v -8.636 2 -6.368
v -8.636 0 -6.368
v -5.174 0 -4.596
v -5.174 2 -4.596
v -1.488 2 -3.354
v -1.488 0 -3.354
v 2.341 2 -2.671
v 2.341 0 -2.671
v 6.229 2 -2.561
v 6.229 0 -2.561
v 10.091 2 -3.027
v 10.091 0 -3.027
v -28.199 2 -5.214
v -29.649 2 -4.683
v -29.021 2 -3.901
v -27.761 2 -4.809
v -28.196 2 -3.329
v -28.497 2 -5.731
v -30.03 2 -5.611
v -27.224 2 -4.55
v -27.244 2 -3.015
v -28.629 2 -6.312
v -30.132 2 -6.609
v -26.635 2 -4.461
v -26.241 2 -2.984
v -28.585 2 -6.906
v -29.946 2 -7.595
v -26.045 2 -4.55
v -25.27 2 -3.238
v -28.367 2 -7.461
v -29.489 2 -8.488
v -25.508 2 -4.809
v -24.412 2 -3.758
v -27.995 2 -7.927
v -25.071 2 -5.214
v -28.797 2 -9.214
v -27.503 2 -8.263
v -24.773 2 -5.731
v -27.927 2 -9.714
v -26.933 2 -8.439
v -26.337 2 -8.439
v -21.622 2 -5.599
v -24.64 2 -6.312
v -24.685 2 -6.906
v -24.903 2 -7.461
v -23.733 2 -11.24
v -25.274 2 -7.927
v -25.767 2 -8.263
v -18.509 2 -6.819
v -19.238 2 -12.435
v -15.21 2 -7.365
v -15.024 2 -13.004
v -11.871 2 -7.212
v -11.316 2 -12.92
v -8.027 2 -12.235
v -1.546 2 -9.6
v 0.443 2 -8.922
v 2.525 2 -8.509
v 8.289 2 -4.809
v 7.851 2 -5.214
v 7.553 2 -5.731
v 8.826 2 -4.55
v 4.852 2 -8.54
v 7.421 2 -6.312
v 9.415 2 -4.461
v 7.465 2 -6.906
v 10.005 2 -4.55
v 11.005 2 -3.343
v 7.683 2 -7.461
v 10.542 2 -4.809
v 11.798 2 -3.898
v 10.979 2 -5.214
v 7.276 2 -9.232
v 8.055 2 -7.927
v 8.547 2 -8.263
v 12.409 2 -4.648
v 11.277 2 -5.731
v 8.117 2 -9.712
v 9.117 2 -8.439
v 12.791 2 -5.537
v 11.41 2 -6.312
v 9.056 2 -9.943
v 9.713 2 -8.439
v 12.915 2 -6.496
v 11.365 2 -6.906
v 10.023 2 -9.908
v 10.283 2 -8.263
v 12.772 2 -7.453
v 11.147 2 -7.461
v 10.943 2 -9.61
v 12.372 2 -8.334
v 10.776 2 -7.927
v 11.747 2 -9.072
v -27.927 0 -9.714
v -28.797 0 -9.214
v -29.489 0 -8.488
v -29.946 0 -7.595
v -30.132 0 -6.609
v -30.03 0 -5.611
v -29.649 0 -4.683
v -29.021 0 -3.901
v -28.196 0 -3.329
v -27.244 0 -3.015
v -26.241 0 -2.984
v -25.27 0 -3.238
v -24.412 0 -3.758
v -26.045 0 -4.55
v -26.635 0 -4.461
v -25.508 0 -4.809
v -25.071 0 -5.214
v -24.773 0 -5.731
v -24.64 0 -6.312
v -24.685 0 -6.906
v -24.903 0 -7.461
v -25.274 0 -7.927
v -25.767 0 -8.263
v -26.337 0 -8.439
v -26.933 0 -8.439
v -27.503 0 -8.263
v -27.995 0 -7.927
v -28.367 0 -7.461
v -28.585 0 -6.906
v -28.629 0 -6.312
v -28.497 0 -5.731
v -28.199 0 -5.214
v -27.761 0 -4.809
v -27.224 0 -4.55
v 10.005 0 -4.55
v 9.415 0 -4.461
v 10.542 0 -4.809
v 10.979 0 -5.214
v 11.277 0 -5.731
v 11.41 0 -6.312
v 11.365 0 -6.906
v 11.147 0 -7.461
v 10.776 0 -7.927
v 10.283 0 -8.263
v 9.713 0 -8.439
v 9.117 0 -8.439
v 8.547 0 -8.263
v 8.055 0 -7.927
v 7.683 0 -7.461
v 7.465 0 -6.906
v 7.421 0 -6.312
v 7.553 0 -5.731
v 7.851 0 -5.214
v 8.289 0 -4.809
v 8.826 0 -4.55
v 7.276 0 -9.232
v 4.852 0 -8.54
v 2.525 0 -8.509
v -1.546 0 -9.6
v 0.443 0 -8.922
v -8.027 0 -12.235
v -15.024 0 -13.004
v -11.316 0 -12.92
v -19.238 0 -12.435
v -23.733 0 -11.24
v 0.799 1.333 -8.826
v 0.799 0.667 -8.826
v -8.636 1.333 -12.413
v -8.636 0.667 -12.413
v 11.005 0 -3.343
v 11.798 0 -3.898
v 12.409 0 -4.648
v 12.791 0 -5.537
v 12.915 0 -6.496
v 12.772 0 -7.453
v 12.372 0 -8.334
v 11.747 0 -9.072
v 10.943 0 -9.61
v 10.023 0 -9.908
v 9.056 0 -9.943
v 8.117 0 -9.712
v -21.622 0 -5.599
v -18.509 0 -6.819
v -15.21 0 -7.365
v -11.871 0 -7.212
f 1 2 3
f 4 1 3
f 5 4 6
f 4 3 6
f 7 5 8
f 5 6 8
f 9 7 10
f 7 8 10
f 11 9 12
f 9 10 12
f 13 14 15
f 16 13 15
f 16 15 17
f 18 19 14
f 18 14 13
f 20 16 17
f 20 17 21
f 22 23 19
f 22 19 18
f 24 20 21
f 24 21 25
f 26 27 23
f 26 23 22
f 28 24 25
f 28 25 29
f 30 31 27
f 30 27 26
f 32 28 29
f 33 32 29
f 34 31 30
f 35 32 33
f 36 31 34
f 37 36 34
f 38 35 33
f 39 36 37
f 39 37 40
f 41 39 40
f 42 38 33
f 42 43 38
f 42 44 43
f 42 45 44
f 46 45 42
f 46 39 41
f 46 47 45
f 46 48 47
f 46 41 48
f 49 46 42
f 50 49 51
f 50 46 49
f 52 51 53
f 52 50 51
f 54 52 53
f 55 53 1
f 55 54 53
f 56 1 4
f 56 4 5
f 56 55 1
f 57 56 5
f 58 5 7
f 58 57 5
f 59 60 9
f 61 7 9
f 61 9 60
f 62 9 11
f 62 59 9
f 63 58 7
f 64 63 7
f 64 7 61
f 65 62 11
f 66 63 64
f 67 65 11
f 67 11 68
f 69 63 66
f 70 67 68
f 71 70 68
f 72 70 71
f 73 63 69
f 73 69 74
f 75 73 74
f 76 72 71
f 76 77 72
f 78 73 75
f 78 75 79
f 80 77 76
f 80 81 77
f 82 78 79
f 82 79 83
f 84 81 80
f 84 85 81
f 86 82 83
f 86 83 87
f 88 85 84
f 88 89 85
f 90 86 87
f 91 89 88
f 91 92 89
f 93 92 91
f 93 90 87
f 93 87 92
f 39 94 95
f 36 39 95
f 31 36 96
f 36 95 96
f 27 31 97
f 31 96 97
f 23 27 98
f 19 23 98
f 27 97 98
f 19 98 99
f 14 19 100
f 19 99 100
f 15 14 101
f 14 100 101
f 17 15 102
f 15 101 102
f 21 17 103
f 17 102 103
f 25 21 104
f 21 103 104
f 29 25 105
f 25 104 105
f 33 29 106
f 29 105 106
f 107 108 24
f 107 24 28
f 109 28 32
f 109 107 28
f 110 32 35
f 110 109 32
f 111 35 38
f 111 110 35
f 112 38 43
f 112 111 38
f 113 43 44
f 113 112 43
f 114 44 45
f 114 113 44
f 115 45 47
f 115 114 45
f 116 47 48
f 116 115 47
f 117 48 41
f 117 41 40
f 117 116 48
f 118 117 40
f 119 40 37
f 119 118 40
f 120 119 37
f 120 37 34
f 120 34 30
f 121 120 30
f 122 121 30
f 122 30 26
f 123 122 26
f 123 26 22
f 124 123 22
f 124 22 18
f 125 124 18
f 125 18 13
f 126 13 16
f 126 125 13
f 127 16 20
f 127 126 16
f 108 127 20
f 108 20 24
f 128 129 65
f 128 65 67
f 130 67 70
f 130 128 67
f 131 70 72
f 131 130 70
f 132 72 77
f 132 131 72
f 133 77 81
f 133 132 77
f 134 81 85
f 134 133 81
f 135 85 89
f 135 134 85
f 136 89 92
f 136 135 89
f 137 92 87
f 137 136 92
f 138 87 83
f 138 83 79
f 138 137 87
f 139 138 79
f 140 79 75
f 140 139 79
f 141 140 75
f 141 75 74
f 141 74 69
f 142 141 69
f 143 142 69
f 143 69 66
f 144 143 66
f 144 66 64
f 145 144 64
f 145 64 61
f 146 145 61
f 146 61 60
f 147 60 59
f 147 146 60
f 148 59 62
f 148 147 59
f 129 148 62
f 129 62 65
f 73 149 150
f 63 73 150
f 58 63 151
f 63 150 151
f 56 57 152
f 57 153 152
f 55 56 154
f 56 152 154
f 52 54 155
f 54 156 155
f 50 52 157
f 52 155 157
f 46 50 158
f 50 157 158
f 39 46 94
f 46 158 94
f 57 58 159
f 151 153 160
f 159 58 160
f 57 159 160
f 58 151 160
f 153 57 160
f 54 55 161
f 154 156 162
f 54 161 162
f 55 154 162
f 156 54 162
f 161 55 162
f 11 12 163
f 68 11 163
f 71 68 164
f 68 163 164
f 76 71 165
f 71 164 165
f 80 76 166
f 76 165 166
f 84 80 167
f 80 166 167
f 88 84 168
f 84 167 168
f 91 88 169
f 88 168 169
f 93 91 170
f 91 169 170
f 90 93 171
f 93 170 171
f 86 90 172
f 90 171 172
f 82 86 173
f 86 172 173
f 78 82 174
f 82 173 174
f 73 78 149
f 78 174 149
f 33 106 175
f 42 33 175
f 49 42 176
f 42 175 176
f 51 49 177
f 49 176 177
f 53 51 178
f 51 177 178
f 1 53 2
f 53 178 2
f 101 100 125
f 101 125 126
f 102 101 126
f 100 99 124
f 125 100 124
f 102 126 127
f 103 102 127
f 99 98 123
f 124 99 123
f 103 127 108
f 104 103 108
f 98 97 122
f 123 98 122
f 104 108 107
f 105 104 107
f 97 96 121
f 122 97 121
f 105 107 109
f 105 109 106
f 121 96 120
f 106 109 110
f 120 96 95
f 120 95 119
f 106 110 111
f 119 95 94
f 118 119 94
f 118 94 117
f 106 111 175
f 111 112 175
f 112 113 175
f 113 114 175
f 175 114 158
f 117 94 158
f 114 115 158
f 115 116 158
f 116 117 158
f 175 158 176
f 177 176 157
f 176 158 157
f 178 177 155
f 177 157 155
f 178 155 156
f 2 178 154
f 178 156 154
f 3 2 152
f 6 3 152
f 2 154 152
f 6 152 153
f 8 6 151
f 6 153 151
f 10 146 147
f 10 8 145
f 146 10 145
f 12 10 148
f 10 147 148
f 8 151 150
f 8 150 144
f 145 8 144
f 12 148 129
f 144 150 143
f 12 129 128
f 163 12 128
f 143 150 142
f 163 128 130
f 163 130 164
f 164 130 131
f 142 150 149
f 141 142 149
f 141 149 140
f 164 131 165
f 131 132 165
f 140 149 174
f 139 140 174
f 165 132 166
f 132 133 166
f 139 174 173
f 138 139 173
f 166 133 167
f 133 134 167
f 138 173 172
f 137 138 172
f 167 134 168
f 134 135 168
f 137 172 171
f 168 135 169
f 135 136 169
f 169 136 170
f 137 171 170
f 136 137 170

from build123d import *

# Parameters (mm, degrees)
SKETCH2_R           = 2.000000006
BOSS_EXTRUDE1_DEPTH = 2


with BuildPart() as part:
    # Sketch2 → Boss-Extrude1 (new body)
    with BuildSketch(Plane(origin=(0, 0, 0), x_dir=(1, 0, 0), z_dir=(0, 1, 0))):
        with BuildLine():
            ThreePointArc((-27.926975425, 9.714102761), (-29.649166118, 4.682637411), (-24.412176183, 3.757693749))
            ThreePointArc((-24.412176183, 3.757693749), (-16.874008703, 7.178664325), (-8.63567196, 6.368222256))
            ThreePointArc((-8.63567196, 6.368222256), (0.414236301, 2.94154028), (10.090788082, 3.027182087))
            ThreePointArc((10.090788082, 3.027182087), (12.602603797, 7.907109409), (7.276457736, 9.231902599))
            add(Edge.make_bspline(
                [(7.276457736, 9.231902599), (4.991666248, 8.239417516), (-0.384919766, 8.392254408), (-11.300329238, 15.23385505), (-22.195691788, 12.013740113), (-27.926975425, 9.714102761)],
                knots=[0.02947385, 0.02947385, 0.02947385, 0.02947385, 0.205279709, 0.474213823, 1, 1, 1, 1], degree=3))
        make_face()
        with Locations(Location((-26.634838433, 6.461352848, 0), (0, 0, 270))):
            Circle(SKETCH2_R, mode=Mode.SUBTRACT)
        with Locations(Location((9.415161567, 6.461352848, 0), (0, 0, 270))):
            Circle(SKETCH2_R, mode=Mode.SUBTRACT)
    extrude(amount=BOSS_EXTRUDE1_DEPTH)


solid = part.part
